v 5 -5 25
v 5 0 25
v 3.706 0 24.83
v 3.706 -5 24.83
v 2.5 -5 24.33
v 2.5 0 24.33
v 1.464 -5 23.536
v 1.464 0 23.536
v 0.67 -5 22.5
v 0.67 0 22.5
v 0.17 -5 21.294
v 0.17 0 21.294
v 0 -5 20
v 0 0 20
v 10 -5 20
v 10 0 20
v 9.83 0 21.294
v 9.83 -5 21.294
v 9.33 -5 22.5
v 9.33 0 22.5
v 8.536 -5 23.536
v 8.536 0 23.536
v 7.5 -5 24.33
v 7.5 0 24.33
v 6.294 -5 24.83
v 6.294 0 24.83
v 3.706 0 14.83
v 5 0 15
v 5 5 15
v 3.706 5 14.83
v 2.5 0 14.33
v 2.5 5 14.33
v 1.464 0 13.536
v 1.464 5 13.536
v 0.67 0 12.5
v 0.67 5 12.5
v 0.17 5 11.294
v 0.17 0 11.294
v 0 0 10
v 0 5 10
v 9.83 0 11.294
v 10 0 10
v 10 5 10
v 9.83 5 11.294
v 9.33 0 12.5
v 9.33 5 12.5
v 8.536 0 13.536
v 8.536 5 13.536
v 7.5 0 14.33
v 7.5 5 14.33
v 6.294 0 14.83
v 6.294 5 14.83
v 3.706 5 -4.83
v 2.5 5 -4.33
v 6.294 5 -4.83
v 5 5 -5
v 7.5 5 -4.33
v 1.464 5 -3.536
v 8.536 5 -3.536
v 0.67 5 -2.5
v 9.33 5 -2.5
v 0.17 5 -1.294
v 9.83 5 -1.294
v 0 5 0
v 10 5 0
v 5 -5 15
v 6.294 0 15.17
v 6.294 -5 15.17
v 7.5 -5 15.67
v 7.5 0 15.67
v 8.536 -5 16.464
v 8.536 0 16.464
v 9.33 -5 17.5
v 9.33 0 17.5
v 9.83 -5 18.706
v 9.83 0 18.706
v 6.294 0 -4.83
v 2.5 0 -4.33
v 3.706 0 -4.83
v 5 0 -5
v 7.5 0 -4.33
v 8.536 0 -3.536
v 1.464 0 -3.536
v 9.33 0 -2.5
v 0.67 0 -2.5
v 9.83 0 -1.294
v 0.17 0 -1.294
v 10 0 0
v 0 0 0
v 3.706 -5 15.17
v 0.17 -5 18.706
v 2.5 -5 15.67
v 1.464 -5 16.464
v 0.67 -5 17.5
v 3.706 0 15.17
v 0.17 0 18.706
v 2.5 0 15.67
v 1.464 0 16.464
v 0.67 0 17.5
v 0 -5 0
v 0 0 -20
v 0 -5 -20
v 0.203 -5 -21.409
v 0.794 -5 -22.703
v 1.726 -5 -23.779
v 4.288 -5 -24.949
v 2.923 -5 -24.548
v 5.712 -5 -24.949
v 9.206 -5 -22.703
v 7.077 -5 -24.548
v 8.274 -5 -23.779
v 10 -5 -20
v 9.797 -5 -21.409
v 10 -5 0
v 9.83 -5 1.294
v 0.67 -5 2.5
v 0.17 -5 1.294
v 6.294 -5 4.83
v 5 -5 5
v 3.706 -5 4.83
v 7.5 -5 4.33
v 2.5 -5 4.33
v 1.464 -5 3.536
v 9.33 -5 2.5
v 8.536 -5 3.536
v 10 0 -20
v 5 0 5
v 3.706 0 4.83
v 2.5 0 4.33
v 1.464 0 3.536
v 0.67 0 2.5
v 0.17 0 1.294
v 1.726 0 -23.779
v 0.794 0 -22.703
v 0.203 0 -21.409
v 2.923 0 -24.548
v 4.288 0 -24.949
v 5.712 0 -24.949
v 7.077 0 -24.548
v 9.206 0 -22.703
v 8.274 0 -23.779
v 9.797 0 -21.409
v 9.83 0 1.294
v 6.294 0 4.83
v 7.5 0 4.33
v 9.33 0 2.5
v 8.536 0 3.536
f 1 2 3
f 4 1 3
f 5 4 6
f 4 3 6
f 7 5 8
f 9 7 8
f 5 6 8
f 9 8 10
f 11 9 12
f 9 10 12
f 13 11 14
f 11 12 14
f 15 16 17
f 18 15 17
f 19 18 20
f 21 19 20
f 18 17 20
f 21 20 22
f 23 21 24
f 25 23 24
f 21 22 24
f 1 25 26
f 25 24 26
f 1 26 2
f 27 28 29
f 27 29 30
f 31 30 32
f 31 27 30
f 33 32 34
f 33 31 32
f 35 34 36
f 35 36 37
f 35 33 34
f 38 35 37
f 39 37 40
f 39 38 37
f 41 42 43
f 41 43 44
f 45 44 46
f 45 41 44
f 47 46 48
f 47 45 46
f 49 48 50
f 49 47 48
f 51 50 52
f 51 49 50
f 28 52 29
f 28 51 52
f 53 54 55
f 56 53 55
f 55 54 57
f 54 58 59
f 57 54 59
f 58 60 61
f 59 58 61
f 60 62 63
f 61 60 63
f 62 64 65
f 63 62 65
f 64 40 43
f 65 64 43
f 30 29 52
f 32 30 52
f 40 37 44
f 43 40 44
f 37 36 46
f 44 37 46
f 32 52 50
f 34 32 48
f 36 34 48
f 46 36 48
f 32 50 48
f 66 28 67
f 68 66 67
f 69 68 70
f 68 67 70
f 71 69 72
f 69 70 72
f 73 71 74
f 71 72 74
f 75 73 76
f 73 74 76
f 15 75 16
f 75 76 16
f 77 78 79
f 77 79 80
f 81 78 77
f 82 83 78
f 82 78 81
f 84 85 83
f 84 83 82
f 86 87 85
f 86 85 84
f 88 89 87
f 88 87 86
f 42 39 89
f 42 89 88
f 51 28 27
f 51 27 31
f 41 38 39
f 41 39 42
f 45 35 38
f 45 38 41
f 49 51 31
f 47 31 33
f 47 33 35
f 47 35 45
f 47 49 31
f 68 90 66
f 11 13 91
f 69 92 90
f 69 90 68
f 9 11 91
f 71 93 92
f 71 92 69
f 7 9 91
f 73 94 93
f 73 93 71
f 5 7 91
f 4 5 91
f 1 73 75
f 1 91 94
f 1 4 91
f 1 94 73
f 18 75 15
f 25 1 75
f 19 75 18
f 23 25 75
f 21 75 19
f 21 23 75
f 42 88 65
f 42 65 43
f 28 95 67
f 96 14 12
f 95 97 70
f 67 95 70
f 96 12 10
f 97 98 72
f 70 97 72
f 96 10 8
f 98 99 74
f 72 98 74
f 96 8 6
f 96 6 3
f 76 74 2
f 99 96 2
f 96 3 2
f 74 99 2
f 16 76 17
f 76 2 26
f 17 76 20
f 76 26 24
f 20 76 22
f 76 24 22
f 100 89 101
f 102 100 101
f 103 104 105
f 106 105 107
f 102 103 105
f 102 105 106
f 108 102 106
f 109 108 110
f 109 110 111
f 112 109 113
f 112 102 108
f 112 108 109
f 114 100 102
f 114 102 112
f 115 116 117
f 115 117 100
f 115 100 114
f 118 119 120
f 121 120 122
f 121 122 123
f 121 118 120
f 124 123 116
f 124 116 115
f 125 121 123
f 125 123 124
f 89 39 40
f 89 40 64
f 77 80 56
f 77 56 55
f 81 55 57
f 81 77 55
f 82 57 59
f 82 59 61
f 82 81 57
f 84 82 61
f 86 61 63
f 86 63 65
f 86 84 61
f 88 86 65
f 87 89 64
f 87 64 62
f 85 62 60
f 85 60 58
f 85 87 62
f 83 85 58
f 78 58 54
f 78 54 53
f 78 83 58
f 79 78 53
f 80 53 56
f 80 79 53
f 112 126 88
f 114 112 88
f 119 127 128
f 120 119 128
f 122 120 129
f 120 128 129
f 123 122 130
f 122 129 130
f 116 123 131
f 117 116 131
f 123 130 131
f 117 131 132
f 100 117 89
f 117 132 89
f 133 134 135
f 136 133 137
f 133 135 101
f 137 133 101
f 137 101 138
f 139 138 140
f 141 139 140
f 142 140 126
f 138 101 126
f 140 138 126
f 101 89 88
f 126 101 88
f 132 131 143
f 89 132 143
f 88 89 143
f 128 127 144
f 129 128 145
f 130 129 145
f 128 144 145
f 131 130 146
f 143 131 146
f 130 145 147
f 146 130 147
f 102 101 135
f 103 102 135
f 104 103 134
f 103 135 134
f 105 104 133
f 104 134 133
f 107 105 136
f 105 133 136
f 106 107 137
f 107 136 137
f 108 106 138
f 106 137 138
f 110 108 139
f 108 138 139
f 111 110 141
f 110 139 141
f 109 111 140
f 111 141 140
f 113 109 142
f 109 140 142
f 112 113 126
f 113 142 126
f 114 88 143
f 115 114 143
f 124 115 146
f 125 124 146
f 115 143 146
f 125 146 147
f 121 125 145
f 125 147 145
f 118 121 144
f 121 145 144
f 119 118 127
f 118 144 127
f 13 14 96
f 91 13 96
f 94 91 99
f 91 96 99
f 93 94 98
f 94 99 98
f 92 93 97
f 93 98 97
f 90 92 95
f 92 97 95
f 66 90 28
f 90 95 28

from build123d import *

# Parameters (mm, degrees)
F1_DEPTH = 5
F2_DEPTH = 5
F3_DEPTH = 5


with BuildPart() as f1:
    # F0 (on Front) → F1 (new body)
    with BuildSketch(Plane.XZ):
        with BuildLine():
            ThreePointArc((4.9999999867, -5), (8.5355339012, -3.5355339106), (10, 0))
            ThreePointArc((10, 0), (8.5355339059, 3.5355339059), (5, 5))
            ThreePointArc((5, 5), (1.4644660941, 3.5355339059), (0, 0))
            ThreePointArc((0, 0), (1.4644660894, -3.5355339012), (4.9999999867, -5))
        make_face()
        with BuildLine():
            ThreePointArc((0, -10), (1.4644660894, -6.4644660988), (4.9999999867, -5))
            ThreePointArc((4.9999999867, -5), (1.4644660894, -3.5355339012), (0, 0))
            Line((0, 0), (0, -10))
        make_face()
        with BuildLine():
            ThreePointArc((5, -15), (8.5355339059, -13.5355339059), (10, -10))
            ThreePointArc((10, -10), (8.5355339012, -6.4644660894), (4.9999999867, -5))
            ThreePointArc((4.9999999867, -5), (1.4644660894, -6.4644660988), (0, -10))
            ThreePointArc((0, -10), (1.4644660941, -13.5355339059), (5, -15))
        make_face()
        with BuildLine():
            ThreePointArc((0, -20), (1.4644660941, -16.4644660941), (5, -15))
            ThreePointArc((5, -15), (1.4644660941, -13.5355339059), (0, -10))
            Line((0, -10), (0, -20))
        make_face()
        with BuildLine():
            ThreePointArc((0, -20), (5, -25), (10, -20))
            ThreePointArc((10, -20), (8.5355339059, -16.4644660941), (5, -15))
            ThreePointArc((5, -15), (1.4644660941, -16.4644660941), (0, -20))
        make_face()
        with BuildLine():
            Line((10, -20), (10, -10))
            ThreePointArc((10, -10), (8.5355339059, -13.5355339059), (5, -15))
            ThreePointArc((5, -15), (8.5355339059, -16.4644660941), (10, -20))
        make_face()
        with BuildLine():
            Line((10, -10), (10, 0))
            ThreePointArc((10, 0), (8.5355339012, -3.5355339106), (4.9999999867, -5))
            ThreePointArc((4.9999999867, -5), (8.5355339012, -6.4644660894), (10, -10))
        make_face()
    extrude(amount=F1_DEPTH)


with BuildPart() as f2:
    # F0 (on Front) → F2 (new body)
    with BuildSketch(Plane.XZ):
        with BuildLine():
            ThreePointArc((4.9999999867, -5), (8.5355339012, -3.5355339106), (10, 0))
            ThreePointArc((10, 0), (8.5355339059, 3.5355339059), (5, 5))
            ThreePointArc((5, 5), (1.4644660941, 3.5355339059), (0, 0))
            ThreePointArc((0, 0), (1.4644660894, -3.5355339012), (4.9999999867, -5))
        make_face()
        with BuildLine():
            ThreePointArc((0, 0), (1.4644660941, 3.5355339059), (5, 5))
            ThreePointArc((5, 5), (1.4644660941, 6.4644660941), (0, 10))
            Line((0, 10), (0, 0))
        make_face()
        with BuildLine():
            ThreePointArc((5, 5), (8.5355339059, 3.5355339059), (10, 0))
            Line((10, 0), (10, 10))
            ThreePointArc((10, 10), (8.5355339059, 6.4644660941), (5, 5))
        make_face()
        with BuildLine():
            ThreePointArc((0, 10), (1.4644660941, 6.4644660941), (5, 5))
            ThreePointArc((5, 5), (8.5355339059, 6.4644660941), (10, 10))
            ThreePointArc((10, 10), (8.5355339059, 13.5355339059), (5, 15))
            ThreePointArc((5, 15), (1.4644660941, 13.5355339059), (0, 10))
        make_face()
    extrude(amount=-F2_DEPTH)


with BuildPart() as f3:
    # F0 (on Front) → F3 (new body)
    with BuildSketch(Plane.XZ):
        with BuildLine():
            ThreePointArc((5, 15), (8.5355339059, 16.4644660941), (10, 20))
            ThreePointArc((10, 20), (8.5355339249, 23.535533887), (5.0000000535, 25))
            ThreePointArc((5.0000000535, 25), (1.464466113, 23.5355339249), (0, 20))
            ThreePointArc((0, 20), (1.4644660941, 16.4644660941), (5, 15))
        make_face()
    extrude(amount=F3_DEPTH)


solid = Compound([f1.part, f2.part, f3.part])
